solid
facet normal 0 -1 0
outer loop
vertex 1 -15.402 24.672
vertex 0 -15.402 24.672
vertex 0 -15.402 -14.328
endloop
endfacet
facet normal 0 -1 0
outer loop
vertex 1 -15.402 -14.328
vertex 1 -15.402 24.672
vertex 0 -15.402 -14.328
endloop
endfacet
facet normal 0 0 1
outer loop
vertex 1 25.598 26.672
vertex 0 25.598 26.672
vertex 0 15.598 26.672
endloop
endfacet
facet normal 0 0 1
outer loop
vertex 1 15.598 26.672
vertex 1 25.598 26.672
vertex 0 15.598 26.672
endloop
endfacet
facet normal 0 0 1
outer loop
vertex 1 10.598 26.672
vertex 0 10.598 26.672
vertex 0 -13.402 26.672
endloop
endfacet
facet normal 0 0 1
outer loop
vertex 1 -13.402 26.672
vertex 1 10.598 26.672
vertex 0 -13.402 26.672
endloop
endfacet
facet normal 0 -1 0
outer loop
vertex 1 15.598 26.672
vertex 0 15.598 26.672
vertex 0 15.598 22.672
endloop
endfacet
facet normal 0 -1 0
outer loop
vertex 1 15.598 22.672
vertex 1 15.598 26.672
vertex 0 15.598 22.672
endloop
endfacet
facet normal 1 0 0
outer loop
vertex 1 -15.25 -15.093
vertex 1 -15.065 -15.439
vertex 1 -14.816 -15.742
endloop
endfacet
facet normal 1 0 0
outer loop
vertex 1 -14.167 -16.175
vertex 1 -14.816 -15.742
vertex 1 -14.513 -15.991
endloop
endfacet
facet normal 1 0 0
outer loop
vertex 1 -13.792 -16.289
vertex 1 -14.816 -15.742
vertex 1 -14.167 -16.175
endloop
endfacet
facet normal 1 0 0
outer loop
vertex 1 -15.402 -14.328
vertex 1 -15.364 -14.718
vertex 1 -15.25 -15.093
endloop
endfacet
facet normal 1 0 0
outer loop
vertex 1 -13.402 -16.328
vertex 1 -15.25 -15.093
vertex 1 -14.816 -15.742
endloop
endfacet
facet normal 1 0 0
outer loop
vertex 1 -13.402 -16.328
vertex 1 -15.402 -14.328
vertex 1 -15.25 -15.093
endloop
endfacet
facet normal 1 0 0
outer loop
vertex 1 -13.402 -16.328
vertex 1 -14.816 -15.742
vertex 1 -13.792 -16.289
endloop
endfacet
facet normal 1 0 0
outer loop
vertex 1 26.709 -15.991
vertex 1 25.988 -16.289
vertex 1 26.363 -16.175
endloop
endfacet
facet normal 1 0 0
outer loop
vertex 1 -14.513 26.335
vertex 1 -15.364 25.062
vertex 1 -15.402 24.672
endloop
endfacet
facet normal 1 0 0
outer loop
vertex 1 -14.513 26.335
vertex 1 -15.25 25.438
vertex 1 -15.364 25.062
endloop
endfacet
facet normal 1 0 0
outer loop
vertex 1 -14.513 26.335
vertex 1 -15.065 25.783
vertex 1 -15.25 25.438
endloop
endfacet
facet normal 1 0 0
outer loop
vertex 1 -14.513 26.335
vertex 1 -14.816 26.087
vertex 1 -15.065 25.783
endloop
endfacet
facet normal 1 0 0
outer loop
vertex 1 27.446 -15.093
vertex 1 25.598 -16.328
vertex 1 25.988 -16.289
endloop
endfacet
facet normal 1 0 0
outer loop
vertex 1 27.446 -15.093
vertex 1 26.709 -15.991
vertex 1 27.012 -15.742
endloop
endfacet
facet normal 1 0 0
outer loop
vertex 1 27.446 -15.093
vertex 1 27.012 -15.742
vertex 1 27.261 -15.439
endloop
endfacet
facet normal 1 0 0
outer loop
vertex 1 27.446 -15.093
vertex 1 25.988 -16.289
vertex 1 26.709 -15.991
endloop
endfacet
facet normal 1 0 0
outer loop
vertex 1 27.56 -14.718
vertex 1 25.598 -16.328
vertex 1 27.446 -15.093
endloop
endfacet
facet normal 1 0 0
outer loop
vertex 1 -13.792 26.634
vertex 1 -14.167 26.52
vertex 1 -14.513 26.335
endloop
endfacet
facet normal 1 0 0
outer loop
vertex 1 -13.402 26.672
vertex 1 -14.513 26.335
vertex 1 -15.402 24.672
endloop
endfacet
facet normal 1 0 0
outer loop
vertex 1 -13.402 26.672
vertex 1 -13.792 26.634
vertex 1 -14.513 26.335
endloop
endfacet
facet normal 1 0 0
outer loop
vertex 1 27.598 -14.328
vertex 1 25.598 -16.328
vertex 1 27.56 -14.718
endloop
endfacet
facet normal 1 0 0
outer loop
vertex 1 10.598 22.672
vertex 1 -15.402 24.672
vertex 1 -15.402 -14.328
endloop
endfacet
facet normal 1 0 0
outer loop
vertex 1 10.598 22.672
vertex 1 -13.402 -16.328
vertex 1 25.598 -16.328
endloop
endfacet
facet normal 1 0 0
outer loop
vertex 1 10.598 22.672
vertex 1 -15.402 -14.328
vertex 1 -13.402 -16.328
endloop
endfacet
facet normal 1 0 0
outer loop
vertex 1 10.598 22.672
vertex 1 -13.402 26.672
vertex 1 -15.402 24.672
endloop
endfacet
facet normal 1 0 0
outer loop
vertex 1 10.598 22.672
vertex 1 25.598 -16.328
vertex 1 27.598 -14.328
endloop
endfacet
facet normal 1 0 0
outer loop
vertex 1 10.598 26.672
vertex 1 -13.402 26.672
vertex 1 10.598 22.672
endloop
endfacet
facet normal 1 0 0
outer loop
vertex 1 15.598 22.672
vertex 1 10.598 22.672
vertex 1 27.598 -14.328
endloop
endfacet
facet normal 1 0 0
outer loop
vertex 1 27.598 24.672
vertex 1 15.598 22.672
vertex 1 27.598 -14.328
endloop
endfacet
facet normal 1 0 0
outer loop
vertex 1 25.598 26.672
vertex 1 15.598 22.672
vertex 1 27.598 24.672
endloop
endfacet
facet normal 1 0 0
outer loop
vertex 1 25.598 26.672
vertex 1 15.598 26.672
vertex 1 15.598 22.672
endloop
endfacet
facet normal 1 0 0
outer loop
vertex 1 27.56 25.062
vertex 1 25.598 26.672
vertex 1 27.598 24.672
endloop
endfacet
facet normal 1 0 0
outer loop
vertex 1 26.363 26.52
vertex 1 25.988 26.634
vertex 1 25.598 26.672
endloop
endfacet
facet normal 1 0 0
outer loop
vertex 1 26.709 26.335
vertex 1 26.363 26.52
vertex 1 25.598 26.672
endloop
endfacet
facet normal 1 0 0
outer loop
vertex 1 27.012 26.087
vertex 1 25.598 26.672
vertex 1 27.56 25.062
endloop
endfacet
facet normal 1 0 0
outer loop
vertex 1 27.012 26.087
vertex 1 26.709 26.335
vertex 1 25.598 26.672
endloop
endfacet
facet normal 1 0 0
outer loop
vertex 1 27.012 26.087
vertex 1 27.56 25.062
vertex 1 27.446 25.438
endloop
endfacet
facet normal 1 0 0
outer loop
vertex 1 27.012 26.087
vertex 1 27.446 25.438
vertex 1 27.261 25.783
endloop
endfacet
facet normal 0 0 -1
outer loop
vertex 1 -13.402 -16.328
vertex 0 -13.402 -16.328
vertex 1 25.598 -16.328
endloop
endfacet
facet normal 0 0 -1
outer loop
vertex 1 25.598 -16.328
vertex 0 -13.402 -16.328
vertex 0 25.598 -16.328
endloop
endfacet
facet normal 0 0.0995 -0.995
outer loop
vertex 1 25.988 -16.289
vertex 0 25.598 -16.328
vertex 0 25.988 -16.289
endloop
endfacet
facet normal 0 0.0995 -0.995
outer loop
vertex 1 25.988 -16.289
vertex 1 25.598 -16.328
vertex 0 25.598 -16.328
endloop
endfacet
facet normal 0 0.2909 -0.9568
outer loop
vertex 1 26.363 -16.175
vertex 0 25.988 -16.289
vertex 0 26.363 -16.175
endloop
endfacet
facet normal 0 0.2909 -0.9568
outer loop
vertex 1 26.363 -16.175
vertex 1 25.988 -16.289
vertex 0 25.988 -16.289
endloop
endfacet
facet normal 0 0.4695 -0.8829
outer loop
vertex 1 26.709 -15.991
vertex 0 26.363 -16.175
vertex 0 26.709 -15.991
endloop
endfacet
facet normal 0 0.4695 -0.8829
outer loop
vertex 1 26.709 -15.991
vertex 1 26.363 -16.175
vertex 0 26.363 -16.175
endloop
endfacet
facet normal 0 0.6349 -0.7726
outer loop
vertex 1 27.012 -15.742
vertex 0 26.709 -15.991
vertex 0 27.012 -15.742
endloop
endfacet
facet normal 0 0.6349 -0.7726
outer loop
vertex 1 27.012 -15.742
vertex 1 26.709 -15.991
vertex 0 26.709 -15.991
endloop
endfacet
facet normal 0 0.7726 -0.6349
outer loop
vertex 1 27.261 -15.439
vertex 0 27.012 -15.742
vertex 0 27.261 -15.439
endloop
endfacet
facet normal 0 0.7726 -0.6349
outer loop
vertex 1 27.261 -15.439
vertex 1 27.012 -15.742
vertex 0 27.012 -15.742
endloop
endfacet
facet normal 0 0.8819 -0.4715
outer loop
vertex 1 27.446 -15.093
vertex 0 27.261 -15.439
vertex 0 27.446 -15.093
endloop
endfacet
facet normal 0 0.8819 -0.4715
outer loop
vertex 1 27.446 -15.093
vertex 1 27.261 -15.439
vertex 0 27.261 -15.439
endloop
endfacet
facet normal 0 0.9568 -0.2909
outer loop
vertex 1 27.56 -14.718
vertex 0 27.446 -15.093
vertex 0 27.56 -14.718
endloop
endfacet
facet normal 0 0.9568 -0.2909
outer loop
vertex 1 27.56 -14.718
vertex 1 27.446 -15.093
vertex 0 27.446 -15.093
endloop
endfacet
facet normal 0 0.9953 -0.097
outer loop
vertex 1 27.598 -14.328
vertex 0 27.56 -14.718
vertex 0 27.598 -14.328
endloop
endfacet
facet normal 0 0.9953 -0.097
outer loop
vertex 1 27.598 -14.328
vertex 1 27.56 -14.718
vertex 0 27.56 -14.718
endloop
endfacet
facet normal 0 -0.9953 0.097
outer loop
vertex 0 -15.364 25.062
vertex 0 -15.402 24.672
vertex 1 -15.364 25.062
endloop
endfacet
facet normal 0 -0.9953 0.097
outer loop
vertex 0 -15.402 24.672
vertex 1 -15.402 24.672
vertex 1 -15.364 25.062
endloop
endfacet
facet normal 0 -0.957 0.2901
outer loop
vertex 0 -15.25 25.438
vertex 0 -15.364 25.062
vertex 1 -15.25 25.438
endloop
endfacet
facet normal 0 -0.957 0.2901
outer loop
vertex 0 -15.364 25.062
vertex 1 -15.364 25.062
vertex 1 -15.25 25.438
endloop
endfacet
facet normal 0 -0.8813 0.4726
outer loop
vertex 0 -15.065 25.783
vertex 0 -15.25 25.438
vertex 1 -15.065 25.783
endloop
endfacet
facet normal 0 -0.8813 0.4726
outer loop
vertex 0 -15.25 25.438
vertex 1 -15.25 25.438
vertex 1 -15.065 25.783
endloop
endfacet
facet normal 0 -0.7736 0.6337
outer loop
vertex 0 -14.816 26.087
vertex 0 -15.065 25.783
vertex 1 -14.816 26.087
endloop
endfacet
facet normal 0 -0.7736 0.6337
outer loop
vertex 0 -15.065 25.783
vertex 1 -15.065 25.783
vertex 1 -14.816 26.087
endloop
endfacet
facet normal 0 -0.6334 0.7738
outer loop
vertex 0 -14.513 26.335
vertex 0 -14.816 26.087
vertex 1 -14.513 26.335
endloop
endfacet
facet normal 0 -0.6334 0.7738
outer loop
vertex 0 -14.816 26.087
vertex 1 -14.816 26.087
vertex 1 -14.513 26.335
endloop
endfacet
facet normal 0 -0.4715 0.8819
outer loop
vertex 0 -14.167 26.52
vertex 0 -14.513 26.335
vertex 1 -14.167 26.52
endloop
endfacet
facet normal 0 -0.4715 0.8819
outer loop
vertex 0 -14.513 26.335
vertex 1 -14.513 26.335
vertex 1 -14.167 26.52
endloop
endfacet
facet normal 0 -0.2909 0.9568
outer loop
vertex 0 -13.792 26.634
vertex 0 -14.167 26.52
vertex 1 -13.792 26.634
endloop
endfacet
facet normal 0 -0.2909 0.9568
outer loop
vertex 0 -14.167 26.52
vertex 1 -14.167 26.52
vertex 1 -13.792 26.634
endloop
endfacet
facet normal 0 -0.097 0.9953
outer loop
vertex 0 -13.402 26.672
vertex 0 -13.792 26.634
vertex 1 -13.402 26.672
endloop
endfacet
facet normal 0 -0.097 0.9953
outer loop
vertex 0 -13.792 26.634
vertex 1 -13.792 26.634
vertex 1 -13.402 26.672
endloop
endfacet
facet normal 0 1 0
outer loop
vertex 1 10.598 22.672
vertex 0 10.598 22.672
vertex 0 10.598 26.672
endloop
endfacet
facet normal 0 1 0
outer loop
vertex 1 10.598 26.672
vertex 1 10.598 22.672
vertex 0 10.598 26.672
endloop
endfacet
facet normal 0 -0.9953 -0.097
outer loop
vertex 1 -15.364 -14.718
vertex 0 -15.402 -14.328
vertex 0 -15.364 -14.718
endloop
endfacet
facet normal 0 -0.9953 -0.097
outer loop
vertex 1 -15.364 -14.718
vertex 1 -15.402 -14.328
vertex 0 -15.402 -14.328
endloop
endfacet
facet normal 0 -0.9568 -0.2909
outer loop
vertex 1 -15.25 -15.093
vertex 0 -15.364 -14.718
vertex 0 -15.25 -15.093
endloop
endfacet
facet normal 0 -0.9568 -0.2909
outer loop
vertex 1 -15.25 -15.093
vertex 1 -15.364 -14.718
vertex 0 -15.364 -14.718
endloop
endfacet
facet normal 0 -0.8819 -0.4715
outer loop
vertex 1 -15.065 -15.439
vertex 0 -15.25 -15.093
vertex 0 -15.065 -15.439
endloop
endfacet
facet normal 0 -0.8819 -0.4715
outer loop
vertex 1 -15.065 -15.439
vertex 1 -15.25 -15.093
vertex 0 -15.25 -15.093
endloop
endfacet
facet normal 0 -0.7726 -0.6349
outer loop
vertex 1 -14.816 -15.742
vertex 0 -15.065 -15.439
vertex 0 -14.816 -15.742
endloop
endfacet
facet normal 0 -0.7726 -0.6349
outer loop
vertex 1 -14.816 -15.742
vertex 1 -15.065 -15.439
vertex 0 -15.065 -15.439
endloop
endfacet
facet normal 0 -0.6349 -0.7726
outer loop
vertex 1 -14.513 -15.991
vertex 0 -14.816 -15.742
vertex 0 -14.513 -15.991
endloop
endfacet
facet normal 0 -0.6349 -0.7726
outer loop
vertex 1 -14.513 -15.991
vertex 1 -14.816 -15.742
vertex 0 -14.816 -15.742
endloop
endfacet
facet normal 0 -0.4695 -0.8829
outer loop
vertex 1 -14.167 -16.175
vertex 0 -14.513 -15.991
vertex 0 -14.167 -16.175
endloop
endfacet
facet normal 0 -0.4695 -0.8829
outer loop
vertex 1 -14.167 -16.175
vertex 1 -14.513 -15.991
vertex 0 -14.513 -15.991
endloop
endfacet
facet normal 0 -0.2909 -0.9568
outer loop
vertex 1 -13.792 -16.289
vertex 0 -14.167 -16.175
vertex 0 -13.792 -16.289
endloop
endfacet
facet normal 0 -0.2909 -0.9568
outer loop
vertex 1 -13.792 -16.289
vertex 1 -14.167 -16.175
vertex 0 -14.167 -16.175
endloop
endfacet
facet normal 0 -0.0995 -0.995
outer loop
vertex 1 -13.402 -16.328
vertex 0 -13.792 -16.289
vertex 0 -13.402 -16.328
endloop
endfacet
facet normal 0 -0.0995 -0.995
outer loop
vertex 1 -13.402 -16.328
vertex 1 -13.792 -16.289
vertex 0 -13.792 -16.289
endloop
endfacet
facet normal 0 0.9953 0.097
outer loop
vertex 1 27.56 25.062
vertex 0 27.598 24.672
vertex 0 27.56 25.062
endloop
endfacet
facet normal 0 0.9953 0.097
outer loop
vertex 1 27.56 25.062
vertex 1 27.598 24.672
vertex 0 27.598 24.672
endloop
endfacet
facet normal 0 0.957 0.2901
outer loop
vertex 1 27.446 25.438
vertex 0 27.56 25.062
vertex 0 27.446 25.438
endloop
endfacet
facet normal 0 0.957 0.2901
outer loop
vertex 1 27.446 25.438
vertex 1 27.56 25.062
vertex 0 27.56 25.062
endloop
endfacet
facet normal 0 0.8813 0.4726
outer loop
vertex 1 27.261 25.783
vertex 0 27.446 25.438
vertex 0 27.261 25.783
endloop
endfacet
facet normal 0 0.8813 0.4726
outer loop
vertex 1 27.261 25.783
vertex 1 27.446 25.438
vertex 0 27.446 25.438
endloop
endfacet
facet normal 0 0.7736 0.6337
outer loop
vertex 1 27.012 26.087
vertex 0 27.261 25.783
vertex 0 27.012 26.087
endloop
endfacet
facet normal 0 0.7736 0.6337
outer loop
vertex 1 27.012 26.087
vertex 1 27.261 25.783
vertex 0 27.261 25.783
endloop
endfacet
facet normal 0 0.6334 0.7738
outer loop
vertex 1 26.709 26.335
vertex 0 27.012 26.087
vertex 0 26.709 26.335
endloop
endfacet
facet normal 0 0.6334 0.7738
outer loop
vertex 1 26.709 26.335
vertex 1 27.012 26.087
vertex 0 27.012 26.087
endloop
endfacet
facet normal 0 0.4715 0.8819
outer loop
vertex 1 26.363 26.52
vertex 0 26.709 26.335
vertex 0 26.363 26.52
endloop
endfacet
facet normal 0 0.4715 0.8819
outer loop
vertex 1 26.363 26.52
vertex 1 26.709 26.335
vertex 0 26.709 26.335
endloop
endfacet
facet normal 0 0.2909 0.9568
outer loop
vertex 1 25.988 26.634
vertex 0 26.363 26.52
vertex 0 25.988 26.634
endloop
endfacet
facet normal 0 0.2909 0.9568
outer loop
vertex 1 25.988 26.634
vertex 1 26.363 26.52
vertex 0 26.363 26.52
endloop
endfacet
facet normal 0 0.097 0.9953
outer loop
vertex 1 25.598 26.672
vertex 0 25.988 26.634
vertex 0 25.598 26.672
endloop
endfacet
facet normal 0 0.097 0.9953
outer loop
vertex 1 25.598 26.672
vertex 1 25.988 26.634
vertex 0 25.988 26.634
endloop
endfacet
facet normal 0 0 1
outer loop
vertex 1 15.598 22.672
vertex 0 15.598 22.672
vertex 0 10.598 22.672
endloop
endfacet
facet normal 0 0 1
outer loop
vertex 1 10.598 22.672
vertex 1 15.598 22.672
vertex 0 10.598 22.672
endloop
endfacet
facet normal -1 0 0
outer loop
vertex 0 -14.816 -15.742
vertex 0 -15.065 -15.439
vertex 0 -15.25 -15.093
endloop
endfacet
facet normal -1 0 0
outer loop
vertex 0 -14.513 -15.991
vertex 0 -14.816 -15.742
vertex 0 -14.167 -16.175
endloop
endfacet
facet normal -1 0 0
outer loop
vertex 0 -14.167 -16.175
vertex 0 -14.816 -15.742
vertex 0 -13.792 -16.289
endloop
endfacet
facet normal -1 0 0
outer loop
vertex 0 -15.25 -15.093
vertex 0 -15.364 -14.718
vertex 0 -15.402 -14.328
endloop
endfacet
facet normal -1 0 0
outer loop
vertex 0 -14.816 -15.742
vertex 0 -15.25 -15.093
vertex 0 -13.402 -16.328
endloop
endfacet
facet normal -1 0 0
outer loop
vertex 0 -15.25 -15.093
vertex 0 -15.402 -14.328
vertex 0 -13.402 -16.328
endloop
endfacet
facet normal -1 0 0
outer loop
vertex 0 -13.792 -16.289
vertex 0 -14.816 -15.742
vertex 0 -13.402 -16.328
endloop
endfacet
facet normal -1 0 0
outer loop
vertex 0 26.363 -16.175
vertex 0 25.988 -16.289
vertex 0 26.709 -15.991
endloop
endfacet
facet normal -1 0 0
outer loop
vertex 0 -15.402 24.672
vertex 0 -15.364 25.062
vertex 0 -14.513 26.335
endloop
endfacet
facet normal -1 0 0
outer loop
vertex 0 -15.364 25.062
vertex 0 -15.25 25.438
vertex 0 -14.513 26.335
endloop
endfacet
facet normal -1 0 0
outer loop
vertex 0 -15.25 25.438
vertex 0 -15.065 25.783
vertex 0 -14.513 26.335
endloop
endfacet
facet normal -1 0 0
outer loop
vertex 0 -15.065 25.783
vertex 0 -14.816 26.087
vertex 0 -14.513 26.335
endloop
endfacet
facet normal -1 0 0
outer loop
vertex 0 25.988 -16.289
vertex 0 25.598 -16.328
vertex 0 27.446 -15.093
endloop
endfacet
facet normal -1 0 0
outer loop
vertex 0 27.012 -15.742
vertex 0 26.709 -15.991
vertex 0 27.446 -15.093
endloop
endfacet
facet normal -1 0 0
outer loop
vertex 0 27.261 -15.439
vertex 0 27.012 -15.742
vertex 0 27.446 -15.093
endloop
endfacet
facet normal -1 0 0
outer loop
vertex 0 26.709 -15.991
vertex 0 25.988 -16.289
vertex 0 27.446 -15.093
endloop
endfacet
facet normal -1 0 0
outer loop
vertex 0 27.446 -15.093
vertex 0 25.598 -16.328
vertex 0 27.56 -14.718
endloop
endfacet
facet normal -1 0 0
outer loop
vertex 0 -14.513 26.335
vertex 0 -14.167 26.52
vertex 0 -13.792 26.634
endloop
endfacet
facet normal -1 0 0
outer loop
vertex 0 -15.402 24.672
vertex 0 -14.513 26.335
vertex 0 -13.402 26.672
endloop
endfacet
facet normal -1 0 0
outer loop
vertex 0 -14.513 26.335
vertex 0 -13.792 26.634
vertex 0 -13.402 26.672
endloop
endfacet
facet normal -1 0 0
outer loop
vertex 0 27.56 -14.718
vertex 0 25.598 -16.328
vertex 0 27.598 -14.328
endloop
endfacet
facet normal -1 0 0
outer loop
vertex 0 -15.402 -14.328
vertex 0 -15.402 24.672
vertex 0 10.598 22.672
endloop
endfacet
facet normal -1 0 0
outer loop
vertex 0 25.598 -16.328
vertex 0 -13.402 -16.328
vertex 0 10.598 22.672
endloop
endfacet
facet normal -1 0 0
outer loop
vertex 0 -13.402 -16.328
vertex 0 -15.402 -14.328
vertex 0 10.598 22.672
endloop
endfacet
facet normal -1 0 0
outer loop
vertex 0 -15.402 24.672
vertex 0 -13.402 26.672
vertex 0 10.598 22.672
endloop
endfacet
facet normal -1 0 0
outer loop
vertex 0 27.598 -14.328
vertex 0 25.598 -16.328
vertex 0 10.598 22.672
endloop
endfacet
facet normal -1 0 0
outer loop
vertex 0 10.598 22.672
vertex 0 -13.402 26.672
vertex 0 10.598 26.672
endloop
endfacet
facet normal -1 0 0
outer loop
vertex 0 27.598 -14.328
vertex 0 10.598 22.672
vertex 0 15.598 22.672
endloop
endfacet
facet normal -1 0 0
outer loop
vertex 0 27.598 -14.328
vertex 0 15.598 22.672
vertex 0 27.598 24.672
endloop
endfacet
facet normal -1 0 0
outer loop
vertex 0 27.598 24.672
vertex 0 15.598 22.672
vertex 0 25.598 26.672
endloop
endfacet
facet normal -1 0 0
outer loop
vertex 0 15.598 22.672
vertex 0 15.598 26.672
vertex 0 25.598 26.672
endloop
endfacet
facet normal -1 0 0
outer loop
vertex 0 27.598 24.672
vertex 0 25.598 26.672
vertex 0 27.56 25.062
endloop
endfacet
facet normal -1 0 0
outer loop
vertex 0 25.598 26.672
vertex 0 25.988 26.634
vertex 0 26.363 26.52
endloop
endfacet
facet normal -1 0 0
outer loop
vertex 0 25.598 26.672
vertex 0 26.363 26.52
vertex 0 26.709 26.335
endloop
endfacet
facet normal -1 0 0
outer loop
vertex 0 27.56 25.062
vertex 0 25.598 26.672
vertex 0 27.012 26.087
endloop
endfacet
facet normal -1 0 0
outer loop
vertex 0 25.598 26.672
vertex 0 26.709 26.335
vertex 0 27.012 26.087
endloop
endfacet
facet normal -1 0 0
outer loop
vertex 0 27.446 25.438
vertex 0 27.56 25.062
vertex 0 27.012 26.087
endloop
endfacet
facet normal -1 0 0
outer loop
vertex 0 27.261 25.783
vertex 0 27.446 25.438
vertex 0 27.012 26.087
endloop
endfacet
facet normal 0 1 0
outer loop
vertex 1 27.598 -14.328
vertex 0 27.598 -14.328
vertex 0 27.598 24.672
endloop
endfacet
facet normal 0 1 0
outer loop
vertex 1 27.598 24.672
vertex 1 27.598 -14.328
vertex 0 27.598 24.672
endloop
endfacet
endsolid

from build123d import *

# Parameters (mm, degrees)
F1_DEPTH = 1
F2_R     = 2


with BuildPart() as f1:
    # F0 (on Right) → F1 (new body)
    with BuildSketch(Plane.YZ):
        Polygon((-15.4019305557, 26.6723162987), (-15.4019305557, -16.3276837013), (27.5980694443, -16.3276837013), (27.5980694443, 26.6723162987), (15.5980694443, 26.6723162987), (15.5980694443, 22.6723162987), (10.5980694443, 22.6723162987), (10.5980694443, 26.6723162987), align=None)
    extrude(amount=F1_DEPTH)

    # F2
    f2_edges = [f1.edges().sort_by_distance(p)[0] for p in [
        (0.5, -15.401931, 26.672316),
        (0.5, -15.401931, -16.327684),
        (0.5, 27.598069, -16.327684),
        (0.5, 27.598069, 26.672316),
    ]]
    fillet(f2_edges, radius=F2_R)


solid = f1.part
